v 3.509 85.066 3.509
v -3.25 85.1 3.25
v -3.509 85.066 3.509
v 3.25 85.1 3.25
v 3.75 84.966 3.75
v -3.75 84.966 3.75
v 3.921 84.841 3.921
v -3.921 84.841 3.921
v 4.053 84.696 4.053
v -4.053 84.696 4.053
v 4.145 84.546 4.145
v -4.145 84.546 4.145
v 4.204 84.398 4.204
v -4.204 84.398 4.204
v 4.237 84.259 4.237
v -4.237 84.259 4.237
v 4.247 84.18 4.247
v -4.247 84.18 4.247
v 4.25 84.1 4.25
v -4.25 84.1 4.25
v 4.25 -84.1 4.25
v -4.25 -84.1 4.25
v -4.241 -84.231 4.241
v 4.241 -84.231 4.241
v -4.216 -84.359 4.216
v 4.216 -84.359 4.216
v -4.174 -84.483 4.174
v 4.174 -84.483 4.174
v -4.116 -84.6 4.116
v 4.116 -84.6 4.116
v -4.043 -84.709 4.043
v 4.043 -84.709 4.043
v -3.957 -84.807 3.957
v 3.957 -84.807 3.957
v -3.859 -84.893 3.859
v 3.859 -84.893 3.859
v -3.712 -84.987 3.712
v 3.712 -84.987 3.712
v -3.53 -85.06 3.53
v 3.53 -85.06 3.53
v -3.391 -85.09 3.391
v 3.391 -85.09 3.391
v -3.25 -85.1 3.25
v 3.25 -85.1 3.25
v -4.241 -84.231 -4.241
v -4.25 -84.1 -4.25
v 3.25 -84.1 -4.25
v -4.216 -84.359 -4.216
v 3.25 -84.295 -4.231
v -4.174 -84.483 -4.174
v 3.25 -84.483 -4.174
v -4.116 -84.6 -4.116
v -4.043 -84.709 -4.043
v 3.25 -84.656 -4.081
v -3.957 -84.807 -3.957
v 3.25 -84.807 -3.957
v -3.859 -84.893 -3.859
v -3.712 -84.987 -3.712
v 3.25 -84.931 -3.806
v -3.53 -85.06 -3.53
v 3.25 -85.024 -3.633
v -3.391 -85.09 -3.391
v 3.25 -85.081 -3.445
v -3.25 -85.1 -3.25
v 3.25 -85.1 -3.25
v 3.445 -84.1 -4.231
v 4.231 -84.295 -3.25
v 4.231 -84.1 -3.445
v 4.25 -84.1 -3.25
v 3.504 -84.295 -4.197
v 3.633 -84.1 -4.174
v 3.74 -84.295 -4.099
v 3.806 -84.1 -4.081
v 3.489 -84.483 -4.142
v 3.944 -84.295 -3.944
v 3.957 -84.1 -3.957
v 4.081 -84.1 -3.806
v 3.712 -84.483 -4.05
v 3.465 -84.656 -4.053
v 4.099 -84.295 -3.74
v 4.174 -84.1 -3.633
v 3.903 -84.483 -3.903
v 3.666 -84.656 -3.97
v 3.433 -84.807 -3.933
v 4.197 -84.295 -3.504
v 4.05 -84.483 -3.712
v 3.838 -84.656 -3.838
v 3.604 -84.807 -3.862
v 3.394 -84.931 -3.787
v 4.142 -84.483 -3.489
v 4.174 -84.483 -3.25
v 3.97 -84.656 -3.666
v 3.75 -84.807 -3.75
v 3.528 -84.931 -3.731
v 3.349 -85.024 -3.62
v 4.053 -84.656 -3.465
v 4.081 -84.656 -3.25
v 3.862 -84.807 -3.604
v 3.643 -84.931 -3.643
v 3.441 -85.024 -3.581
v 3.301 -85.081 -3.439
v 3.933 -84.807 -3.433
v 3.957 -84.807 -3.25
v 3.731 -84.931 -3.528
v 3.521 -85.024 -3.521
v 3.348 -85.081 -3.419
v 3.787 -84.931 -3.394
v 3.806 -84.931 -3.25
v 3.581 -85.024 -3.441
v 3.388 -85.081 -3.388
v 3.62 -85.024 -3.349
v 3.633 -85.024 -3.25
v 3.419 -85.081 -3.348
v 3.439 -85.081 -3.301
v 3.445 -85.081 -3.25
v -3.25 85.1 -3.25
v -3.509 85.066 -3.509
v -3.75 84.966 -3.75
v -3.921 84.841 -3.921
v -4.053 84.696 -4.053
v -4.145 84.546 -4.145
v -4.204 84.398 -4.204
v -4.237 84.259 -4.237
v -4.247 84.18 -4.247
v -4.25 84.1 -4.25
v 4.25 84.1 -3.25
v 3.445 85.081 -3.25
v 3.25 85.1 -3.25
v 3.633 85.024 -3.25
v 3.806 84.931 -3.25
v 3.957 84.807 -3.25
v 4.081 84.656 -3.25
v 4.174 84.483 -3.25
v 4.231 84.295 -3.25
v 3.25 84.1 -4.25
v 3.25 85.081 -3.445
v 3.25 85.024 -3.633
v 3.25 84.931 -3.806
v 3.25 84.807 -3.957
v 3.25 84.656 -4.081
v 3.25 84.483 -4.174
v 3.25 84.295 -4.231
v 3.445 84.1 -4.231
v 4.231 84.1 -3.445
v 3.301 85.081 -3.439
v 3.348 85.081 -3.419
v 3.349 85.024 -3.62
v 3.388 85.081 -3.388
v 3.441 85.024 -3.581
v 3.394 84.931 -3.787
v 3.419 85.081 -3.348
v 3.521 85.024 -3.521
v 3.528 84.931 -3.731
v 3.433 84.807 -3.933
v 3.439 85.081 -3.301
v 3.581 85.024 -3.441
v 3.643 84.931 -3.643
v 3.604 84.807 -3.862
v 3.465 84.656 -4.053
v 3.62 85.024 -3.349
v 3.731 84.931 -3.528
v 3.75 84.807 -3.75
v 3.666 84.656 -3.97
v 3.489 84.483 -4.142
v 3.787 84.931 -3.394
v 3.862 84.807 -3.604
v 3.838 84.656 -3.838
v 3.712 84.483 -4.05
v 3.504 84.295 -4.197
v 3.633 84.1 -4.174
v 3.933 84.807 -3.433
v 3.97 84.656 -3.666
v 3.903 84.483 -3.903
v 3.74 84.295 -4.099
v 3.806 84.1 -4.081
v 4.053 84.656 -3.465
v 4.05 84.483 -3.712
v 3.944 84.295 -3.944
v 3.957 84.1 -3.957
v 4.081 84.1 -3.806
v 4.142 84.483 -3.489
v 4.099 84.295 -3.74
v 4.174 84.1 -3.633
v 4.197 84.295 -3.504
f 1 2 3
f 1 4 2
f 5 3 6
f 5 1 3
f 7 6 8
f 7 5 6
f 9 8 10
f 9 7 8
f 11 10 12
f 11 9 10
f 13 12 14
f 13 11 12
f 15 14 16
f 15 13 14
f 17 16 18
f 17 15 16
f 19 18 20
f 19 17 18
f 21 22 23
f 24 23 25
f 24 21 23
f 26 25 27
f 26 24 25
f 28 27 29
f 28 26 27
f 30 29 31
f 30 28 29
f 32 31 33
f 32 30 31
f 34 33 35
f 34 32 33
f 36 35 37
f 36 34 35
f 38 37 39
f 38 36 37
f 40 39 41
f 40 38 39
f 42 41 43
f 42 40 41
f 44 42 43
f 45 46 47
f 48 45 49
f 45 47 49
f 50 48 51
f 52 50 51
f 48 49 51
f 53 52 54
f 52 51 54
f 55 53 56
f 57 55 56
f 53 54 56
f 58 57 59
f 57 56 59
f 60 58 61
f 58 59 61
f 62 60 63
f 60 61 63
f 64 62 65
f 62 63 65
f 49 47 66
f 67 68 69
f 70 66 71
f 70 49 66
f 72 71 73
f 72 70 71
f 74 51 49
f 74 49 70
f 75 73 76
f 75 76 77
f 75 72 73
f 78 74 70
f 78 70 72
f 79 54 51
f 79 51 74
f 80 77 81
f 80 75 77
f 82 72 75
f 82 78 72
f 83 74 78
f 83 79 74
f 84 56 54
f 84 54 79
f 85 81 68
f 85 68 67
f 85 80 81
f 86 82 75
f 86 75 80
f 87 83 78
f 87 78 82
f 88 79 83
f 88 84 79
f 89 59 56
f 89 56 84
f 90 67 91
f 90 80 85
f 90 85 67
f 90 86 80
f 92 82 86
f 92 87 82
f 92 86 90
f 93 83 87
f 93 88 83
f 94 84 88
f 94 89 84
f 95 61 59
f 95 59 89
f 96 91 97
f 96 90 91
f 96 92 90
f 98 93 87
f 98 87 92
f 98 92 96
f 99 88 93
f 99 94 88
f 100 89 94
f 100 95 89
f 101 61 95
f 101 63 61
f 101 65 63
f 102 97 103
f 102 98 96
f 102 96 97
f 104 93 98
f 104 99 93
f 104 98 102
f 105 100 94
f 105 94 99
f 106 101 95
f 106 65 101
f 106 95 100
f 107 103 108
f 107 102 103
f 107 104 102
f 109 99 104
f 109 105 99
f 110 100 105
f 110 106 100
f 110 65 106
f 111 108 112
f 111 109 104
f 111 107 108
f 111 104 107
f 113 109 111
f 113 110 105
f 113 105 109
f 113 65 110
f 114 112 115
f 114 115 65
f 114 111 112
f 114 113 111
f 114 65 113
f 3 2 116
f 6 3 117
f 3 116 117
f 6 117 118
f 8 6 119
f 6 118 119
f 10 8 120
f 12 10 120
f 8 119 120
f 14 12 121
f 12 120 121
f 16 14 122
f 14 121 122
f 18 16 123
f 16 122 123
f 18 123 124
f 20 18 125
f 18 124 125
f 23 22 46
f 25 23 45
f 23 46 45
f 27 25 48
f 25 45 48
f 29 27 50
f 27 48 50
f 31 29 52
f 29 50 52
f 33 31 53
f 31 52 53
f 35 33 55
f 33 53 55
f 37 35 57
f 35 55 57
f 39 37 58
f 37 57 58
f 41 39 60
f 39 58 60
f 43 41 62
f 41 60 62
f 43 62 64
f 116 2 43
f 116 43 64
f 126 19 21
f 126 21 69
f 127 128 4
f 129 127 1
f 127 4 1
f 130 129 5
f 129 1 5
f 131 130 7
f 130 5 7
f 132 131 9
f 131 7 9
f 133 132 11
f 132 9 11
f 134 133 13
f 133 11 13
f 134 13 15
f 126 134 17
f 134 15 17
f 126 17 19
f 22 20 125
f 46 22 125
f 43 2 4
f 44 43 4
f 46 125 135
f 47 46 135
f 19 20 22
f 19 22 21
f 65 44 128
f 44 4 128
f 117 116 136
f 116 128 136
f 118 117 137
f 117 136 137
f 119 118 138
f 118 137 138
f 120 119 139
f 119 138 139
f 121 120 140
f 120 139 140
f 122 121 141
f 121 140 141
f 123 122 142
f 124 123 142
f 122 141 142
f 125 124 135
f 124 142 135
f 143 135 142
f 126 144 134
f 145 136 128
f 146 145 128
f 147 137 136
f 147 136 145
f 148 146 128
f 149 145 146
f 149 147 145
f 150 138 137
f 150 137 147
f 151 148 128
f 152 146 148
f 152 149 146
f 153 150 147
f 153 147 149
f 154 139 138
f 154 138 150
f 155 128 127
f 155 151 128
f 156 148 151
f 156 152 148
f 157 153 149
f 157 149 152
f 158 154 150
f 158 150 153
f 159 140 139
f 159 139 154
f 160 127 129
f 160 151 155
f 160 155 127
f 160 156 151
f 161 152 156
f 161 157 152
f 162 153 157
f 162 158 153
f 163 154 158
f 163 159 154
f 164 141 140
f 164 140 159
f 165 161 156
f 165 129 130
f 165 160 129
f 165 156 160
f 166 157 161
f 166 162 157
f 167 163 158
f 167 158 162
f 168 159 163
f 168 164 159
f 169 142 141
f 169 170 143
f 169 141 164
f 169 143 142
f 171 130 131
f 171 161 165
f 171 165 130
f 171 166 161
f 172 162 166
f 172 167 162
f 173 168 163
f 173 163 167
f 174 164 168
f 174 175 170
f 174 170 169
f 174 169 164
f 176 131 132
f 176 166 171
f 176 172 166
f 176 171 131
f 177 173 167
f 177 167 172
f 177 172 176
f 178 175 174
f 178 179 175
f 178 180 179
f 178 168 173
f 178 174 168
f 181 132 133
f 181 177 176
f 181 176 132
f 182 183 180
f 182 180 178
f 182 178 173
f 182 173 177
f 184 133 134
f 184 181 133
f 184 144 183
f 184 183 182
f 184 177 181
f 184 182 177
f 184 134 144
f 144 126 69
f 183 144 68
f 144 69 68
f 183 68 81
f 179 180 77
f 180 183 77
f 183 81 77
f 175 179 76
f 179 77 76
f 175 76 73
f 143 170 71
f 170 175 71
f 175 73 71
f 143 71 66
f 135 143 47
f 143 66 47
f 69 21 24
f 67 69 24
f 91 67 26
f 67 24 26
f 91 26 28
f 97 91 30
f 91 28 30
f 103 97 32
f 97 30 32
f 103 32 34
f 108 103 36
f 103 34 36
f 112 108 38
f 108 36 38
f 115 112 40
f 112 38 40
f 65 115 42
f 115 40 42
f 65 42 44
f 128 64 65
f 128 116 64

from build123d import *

# Parameters (mm, degrees)
SKETCH1_W           = 8.5
SKETCH1_H           = 8.5
SKETCH1_W_2         = 6.5
SKETCH1_H_2         = 6.5
BOSS_EXTRUDE1_DEPTH = 85.1
FILLET1_R           = 1
FILLET2_R           = 1
FILLET3_R           = 1


with BuildPart() as part:
    # Sketch1 → Boss-Extrude1 (new, symmetric)
    with BuildSketch(Plane(origin=(0, 0, 0), x_dir=(1, 0, 0), z_dir=(0, 1, 0))):
        Rectangle(SKETCH1_W, SKETCH1_H)
        Rectangle(SKETCH1_W_2, SKETCH1_H_2, mode=Mode.SUBTRACT)
    extrude(amount=BOSS_EXTRUDE1_DEPTH, both=True)

    # Fillet1
    fillet1_edges = [part.edges().sort_by_distance(p)[0] for p in [
        (4.25, 0, -4.25),
    ]]
    fillet(fillet1_edges, radius=FILLET1_R)

    # Fillet2
    fillet2_edges = [part.edges().sort_by_distance(p)[0] for p in [
        (-4.25, 85.1, 0),
        (0, 85.1, 4.25),
        (-0.5, 85.1, -4.25),
        (3.957106781, 85.1, -3.957106781),
        (4.25, 85.1, 0.5),
    ]]
    fillet(fillet2_edges, radius=FILLET2_R - 0.0001)  # a hair under: the kernel refuses the full size

    # Fillet3
    fillet3_edges = [part.edges().sort_by_distance(p)[0] for p in [
        (-0.5, -85.1, -4.25),
        (3.957106781, -85.1, -3.957106781),
        (0, -85.1, 4.25),
        (-4.25, -85.1, 0),
        (4.25, -85.1, 0.5),
    ]]
    fillet(fillet3_edges, radius=FILLET3_R - 0.0001)  # a hair under: the kernel refuses the full size


solid = part.part
